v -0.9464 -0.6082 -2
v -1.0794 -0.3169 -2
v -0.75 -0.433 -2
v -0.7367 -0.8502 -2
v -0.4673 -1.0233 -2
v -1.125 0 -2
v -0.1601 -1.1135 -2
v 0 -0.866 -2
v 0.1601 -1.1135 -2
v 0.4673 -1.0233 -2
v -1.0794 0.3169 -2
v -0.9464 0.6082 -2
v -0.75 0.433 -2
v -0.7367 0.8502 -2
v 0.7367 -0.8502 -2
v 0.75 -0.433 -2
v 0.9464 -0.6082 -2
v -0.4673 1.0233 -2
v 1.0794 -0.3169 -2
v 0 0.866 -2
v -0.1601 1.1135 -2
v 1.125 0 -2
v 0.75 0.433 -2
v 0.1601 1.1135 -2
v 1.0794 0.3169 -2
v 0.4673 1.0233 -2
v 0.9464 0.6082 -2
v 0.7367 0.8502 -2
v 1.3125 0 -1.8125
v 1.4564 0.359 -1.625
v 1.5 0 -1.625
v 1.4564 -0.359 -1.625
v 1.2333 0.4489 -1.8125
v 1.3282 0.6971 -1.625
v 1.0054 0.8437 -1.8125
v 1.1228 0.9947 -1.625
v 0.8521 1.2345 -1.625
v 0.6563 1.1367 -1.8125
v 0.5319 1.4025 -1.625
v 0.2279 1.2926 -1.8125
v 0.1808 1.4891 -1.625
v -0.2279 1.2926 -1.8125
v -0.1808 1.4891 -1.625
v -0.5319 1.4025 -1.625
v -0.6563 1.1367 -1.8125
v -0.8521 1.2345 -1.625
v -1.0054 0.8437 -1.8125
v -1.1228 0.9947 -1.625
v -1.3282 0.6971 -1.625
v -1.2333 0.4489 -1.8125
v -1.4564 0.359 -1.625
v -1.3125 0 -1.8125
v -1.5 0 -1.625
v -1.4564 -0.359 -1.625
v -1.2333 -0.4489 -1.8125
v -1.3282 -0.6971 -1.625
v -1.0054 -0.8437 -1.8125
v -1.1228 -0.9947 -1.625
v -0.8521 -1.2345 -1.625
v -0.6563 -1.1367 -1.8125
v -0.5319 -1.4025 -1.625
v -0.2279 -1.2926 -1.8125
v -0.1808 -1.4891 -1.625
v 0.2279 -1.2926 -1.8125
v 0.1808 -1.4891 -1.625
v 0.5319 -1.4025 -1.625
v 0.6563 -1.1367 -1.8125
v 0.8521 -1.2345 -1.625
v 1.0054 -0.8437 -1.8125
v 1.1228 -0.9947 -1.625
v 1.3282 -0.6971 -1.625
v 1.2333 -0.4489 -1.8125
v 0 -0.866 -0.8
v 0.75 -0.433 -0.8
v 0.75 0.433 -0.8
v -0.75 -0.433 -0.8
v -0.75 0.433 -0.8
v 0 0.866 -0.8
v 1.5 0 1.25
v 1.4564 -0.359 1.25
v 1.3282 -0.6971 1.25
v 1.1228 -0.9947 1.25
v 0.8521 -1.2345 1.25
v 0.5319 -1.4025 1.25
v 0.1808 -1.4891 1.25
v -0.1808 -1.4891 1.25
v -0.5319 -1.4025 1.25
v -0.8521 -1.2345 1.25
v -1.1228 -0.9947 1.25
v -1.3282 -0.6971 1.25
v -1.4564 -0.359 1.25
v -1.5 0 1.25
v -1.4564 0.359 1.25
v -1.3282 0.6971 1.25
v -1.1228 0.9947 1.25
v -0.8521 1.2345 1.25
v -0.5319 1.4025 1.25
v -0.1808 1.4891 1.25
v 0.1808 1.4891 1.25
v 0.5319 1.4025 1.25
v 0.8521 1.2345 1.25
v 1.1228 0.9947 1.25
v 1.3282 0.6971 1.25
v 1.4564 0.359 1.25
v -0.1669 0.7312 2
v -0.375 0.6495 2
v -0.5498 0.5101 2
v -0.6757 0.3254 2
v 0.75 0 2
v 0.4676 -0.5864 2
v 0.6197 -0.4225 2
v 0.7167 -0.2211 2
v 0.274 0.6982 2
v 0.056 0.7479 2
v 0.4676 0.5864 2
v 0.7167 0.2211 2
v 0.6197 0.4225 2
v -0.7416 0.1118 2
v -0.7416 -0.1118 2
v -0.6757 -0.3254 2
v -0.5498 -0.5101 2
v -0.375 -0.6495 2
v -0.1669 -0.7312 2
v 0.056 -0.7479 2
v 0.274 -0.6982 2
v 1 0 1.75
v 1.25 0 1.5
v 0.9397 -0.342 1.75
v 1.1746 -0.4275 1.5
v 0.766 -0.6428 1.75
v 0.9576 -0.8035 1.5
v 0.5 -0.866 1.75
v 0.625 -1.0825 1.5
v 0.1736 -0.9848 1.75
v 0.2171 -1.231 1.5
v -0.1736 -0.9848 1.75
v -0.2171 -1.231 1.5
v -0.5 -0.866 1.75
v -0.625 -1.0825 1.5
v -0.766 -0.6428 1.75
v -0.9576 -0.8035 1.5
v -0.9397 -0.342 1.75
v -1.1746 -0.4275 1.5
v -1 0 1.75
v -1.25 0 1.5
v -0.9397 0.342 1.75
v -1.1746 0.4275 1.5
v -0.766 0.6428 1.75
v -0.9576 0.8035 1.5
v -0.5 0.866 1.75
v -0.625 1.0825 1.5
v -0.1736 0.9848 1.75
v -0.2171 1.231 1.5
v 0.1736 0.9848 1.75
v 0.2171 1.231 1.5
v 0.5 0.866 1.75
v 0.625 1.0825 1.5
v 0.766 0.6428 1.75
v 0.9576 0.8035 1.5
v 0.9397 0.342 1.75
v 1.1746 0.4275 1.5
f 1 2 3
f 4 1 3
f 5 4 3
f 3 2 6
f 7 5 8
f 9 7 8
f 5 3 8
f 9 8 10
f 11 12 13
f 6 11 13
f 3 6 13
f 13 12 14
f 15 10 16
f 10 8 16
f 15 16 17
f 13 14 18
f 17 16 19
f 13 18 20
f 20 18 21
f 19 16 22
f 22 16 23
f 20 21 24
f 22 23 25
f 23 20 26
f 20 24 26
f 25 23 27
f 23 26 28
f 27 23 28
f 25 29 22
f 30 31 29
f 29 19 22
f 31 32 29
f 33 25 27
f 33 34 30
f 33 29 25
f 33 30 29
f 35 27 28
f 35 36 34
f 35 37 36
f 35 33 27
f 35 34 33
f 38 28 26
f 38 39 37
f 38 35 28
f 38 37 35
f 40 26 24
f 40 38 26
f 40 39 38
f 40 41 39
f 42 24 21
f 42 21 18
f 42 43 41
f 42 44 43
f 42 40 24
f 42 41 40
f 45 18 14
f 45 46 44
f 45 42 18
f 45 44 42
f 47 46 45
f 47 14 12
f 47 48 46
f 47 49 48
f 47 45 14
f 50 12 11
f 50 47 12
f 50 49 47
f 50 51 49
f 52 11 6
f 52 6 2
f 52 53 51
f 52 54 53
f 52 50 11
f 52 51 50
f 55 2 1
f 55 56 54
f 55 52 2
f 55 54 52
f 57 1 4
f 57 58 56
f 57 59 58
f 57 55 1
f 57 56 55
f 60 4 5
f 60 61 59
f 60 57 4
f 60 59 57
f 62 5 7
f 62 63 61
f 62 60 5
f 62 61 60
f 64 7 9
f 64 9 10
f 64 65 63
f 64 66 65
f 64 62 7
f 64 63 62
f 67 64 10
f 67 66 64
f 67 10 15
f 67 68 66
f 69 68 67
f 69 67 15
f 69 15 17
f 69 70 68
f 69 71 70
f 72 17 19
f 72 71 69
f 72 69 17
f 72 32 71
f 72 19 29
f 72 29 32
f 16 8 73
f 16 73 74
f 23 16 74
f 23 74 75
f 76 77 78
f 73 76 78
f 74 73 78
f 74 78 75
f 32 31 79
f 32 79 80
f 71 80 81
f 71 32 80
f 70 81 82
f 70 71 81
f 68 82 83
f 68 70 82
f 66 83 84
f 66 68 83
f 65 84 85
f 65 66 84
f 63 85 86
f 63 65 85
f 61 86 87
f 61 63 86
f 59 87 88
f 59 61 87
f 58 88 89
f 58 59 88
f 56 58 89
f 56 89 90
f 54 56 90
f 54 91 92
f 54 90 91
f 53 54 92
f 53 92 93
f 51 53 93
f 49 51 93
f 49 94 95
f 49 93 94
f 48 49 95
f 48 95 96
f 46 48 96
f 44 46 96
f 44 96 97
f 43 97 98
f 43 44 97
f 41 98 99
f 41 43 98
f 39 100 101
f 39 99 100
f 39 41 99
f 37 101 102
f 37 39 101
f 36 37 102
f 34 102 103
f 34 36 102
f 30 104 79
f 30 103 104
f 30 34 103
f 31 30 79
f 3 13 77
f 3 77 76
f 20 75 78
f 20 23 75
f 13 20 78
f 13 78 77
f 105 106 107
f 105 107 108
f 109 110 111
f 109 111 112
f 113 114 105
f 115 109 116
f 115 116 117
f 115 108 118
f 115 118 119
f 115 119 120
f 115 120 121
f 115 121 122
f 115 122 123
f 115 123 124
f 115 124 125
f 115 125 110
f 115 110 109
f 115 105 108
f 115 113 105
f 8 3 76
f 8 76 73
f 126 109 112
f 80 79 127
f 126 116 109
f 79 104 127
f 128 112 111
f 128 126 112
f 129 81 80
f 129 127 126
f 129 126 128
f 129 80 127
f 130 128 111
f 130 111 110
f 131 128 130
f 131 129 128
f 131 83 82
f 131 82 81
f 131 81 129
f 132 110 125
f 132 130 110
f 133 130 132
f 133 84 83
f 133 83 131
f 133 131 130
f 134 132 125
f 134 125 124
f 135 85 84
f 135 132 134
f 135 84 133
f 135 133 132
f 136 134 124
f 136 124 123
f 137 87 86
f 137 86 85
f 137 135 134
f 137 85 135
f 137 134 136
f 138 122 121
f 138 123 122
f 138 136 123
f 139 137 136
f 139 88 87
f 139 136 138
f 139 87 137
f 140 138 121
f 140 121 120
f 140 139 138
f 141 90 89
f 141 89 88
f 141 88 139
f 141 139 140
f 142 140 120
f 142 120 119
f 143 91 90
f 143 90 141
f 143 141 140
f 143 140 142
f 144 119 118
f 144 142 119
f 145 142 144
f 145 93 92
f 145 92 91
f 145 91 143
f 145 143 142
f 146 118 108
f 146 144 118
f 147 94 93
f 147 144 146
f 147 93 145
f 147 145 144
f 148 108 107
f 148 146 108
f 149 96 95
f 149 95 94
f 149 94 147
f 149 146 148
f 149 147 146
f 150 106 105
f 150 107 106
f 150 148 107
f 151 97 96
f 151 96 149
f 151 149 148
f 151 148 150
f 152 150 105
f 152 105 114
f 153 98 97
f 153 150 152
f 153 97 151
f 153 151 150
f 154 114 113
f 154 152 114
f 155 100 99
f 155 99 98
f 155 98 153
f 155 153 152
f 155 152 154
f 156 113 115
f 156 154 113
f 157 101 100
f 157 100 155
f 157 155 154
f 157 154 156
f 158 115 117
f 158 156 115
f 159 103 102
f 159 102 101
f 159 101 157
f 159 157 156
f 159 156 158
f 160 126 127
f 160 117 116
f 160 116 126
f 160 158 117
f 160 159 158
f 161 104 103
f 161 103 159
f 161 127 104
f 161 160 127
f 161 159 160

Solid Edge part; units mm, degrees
sketch "Sketch1" plane through (0, 0, 0) normal (0, -1, 0) x (1, 0, 0)
  line L0 (0, 2) -> (1.5, 2)
  line L1 (1.5, 2) -> (1.5, -2)
  line L2 (1.5, -2) -> (0, -2)
  dimension "D1" = 4
revolve "RevolvedProtrusion1" add sketch "Sketch1" angle 360 about axis through (0, 0, -2) along (0, 0, 1)
chamfer "Chamfer1" distance 0.75 angle 45 1 edges at (-1.5, 0, 2)
chamfer "Chamfer_2" distance 0.375 angle 45 1 edges at (-1.5, 0, -2)
cosmetic_thread "Thread1" size "M3"
sketch "Sketch2" plane through (0, 0, -2) normal (0, 0, -1) x (-1, 0, 0)
  line L0 (0.75, 0.433) -> (0.75, -0.433)
  line L1 (0.75, -0.433) -> (0, -0.866)
  line L2 (0, -0.866) -> (-0.75, -0.433)
  line L3 (-0.75, -0.433) -> (-0.75, 0.433)
  line L4 (-0.75, 0.433) -> (0, 0.866)
  line L5 (0, 0.866) -> (0.75, 0.433)
  dimension "D1" = 1.5
extrude "ExtrudedCutout_1" cut sketch "Sketch2" against normal blind 1.2
properties material "Stainless steel"
